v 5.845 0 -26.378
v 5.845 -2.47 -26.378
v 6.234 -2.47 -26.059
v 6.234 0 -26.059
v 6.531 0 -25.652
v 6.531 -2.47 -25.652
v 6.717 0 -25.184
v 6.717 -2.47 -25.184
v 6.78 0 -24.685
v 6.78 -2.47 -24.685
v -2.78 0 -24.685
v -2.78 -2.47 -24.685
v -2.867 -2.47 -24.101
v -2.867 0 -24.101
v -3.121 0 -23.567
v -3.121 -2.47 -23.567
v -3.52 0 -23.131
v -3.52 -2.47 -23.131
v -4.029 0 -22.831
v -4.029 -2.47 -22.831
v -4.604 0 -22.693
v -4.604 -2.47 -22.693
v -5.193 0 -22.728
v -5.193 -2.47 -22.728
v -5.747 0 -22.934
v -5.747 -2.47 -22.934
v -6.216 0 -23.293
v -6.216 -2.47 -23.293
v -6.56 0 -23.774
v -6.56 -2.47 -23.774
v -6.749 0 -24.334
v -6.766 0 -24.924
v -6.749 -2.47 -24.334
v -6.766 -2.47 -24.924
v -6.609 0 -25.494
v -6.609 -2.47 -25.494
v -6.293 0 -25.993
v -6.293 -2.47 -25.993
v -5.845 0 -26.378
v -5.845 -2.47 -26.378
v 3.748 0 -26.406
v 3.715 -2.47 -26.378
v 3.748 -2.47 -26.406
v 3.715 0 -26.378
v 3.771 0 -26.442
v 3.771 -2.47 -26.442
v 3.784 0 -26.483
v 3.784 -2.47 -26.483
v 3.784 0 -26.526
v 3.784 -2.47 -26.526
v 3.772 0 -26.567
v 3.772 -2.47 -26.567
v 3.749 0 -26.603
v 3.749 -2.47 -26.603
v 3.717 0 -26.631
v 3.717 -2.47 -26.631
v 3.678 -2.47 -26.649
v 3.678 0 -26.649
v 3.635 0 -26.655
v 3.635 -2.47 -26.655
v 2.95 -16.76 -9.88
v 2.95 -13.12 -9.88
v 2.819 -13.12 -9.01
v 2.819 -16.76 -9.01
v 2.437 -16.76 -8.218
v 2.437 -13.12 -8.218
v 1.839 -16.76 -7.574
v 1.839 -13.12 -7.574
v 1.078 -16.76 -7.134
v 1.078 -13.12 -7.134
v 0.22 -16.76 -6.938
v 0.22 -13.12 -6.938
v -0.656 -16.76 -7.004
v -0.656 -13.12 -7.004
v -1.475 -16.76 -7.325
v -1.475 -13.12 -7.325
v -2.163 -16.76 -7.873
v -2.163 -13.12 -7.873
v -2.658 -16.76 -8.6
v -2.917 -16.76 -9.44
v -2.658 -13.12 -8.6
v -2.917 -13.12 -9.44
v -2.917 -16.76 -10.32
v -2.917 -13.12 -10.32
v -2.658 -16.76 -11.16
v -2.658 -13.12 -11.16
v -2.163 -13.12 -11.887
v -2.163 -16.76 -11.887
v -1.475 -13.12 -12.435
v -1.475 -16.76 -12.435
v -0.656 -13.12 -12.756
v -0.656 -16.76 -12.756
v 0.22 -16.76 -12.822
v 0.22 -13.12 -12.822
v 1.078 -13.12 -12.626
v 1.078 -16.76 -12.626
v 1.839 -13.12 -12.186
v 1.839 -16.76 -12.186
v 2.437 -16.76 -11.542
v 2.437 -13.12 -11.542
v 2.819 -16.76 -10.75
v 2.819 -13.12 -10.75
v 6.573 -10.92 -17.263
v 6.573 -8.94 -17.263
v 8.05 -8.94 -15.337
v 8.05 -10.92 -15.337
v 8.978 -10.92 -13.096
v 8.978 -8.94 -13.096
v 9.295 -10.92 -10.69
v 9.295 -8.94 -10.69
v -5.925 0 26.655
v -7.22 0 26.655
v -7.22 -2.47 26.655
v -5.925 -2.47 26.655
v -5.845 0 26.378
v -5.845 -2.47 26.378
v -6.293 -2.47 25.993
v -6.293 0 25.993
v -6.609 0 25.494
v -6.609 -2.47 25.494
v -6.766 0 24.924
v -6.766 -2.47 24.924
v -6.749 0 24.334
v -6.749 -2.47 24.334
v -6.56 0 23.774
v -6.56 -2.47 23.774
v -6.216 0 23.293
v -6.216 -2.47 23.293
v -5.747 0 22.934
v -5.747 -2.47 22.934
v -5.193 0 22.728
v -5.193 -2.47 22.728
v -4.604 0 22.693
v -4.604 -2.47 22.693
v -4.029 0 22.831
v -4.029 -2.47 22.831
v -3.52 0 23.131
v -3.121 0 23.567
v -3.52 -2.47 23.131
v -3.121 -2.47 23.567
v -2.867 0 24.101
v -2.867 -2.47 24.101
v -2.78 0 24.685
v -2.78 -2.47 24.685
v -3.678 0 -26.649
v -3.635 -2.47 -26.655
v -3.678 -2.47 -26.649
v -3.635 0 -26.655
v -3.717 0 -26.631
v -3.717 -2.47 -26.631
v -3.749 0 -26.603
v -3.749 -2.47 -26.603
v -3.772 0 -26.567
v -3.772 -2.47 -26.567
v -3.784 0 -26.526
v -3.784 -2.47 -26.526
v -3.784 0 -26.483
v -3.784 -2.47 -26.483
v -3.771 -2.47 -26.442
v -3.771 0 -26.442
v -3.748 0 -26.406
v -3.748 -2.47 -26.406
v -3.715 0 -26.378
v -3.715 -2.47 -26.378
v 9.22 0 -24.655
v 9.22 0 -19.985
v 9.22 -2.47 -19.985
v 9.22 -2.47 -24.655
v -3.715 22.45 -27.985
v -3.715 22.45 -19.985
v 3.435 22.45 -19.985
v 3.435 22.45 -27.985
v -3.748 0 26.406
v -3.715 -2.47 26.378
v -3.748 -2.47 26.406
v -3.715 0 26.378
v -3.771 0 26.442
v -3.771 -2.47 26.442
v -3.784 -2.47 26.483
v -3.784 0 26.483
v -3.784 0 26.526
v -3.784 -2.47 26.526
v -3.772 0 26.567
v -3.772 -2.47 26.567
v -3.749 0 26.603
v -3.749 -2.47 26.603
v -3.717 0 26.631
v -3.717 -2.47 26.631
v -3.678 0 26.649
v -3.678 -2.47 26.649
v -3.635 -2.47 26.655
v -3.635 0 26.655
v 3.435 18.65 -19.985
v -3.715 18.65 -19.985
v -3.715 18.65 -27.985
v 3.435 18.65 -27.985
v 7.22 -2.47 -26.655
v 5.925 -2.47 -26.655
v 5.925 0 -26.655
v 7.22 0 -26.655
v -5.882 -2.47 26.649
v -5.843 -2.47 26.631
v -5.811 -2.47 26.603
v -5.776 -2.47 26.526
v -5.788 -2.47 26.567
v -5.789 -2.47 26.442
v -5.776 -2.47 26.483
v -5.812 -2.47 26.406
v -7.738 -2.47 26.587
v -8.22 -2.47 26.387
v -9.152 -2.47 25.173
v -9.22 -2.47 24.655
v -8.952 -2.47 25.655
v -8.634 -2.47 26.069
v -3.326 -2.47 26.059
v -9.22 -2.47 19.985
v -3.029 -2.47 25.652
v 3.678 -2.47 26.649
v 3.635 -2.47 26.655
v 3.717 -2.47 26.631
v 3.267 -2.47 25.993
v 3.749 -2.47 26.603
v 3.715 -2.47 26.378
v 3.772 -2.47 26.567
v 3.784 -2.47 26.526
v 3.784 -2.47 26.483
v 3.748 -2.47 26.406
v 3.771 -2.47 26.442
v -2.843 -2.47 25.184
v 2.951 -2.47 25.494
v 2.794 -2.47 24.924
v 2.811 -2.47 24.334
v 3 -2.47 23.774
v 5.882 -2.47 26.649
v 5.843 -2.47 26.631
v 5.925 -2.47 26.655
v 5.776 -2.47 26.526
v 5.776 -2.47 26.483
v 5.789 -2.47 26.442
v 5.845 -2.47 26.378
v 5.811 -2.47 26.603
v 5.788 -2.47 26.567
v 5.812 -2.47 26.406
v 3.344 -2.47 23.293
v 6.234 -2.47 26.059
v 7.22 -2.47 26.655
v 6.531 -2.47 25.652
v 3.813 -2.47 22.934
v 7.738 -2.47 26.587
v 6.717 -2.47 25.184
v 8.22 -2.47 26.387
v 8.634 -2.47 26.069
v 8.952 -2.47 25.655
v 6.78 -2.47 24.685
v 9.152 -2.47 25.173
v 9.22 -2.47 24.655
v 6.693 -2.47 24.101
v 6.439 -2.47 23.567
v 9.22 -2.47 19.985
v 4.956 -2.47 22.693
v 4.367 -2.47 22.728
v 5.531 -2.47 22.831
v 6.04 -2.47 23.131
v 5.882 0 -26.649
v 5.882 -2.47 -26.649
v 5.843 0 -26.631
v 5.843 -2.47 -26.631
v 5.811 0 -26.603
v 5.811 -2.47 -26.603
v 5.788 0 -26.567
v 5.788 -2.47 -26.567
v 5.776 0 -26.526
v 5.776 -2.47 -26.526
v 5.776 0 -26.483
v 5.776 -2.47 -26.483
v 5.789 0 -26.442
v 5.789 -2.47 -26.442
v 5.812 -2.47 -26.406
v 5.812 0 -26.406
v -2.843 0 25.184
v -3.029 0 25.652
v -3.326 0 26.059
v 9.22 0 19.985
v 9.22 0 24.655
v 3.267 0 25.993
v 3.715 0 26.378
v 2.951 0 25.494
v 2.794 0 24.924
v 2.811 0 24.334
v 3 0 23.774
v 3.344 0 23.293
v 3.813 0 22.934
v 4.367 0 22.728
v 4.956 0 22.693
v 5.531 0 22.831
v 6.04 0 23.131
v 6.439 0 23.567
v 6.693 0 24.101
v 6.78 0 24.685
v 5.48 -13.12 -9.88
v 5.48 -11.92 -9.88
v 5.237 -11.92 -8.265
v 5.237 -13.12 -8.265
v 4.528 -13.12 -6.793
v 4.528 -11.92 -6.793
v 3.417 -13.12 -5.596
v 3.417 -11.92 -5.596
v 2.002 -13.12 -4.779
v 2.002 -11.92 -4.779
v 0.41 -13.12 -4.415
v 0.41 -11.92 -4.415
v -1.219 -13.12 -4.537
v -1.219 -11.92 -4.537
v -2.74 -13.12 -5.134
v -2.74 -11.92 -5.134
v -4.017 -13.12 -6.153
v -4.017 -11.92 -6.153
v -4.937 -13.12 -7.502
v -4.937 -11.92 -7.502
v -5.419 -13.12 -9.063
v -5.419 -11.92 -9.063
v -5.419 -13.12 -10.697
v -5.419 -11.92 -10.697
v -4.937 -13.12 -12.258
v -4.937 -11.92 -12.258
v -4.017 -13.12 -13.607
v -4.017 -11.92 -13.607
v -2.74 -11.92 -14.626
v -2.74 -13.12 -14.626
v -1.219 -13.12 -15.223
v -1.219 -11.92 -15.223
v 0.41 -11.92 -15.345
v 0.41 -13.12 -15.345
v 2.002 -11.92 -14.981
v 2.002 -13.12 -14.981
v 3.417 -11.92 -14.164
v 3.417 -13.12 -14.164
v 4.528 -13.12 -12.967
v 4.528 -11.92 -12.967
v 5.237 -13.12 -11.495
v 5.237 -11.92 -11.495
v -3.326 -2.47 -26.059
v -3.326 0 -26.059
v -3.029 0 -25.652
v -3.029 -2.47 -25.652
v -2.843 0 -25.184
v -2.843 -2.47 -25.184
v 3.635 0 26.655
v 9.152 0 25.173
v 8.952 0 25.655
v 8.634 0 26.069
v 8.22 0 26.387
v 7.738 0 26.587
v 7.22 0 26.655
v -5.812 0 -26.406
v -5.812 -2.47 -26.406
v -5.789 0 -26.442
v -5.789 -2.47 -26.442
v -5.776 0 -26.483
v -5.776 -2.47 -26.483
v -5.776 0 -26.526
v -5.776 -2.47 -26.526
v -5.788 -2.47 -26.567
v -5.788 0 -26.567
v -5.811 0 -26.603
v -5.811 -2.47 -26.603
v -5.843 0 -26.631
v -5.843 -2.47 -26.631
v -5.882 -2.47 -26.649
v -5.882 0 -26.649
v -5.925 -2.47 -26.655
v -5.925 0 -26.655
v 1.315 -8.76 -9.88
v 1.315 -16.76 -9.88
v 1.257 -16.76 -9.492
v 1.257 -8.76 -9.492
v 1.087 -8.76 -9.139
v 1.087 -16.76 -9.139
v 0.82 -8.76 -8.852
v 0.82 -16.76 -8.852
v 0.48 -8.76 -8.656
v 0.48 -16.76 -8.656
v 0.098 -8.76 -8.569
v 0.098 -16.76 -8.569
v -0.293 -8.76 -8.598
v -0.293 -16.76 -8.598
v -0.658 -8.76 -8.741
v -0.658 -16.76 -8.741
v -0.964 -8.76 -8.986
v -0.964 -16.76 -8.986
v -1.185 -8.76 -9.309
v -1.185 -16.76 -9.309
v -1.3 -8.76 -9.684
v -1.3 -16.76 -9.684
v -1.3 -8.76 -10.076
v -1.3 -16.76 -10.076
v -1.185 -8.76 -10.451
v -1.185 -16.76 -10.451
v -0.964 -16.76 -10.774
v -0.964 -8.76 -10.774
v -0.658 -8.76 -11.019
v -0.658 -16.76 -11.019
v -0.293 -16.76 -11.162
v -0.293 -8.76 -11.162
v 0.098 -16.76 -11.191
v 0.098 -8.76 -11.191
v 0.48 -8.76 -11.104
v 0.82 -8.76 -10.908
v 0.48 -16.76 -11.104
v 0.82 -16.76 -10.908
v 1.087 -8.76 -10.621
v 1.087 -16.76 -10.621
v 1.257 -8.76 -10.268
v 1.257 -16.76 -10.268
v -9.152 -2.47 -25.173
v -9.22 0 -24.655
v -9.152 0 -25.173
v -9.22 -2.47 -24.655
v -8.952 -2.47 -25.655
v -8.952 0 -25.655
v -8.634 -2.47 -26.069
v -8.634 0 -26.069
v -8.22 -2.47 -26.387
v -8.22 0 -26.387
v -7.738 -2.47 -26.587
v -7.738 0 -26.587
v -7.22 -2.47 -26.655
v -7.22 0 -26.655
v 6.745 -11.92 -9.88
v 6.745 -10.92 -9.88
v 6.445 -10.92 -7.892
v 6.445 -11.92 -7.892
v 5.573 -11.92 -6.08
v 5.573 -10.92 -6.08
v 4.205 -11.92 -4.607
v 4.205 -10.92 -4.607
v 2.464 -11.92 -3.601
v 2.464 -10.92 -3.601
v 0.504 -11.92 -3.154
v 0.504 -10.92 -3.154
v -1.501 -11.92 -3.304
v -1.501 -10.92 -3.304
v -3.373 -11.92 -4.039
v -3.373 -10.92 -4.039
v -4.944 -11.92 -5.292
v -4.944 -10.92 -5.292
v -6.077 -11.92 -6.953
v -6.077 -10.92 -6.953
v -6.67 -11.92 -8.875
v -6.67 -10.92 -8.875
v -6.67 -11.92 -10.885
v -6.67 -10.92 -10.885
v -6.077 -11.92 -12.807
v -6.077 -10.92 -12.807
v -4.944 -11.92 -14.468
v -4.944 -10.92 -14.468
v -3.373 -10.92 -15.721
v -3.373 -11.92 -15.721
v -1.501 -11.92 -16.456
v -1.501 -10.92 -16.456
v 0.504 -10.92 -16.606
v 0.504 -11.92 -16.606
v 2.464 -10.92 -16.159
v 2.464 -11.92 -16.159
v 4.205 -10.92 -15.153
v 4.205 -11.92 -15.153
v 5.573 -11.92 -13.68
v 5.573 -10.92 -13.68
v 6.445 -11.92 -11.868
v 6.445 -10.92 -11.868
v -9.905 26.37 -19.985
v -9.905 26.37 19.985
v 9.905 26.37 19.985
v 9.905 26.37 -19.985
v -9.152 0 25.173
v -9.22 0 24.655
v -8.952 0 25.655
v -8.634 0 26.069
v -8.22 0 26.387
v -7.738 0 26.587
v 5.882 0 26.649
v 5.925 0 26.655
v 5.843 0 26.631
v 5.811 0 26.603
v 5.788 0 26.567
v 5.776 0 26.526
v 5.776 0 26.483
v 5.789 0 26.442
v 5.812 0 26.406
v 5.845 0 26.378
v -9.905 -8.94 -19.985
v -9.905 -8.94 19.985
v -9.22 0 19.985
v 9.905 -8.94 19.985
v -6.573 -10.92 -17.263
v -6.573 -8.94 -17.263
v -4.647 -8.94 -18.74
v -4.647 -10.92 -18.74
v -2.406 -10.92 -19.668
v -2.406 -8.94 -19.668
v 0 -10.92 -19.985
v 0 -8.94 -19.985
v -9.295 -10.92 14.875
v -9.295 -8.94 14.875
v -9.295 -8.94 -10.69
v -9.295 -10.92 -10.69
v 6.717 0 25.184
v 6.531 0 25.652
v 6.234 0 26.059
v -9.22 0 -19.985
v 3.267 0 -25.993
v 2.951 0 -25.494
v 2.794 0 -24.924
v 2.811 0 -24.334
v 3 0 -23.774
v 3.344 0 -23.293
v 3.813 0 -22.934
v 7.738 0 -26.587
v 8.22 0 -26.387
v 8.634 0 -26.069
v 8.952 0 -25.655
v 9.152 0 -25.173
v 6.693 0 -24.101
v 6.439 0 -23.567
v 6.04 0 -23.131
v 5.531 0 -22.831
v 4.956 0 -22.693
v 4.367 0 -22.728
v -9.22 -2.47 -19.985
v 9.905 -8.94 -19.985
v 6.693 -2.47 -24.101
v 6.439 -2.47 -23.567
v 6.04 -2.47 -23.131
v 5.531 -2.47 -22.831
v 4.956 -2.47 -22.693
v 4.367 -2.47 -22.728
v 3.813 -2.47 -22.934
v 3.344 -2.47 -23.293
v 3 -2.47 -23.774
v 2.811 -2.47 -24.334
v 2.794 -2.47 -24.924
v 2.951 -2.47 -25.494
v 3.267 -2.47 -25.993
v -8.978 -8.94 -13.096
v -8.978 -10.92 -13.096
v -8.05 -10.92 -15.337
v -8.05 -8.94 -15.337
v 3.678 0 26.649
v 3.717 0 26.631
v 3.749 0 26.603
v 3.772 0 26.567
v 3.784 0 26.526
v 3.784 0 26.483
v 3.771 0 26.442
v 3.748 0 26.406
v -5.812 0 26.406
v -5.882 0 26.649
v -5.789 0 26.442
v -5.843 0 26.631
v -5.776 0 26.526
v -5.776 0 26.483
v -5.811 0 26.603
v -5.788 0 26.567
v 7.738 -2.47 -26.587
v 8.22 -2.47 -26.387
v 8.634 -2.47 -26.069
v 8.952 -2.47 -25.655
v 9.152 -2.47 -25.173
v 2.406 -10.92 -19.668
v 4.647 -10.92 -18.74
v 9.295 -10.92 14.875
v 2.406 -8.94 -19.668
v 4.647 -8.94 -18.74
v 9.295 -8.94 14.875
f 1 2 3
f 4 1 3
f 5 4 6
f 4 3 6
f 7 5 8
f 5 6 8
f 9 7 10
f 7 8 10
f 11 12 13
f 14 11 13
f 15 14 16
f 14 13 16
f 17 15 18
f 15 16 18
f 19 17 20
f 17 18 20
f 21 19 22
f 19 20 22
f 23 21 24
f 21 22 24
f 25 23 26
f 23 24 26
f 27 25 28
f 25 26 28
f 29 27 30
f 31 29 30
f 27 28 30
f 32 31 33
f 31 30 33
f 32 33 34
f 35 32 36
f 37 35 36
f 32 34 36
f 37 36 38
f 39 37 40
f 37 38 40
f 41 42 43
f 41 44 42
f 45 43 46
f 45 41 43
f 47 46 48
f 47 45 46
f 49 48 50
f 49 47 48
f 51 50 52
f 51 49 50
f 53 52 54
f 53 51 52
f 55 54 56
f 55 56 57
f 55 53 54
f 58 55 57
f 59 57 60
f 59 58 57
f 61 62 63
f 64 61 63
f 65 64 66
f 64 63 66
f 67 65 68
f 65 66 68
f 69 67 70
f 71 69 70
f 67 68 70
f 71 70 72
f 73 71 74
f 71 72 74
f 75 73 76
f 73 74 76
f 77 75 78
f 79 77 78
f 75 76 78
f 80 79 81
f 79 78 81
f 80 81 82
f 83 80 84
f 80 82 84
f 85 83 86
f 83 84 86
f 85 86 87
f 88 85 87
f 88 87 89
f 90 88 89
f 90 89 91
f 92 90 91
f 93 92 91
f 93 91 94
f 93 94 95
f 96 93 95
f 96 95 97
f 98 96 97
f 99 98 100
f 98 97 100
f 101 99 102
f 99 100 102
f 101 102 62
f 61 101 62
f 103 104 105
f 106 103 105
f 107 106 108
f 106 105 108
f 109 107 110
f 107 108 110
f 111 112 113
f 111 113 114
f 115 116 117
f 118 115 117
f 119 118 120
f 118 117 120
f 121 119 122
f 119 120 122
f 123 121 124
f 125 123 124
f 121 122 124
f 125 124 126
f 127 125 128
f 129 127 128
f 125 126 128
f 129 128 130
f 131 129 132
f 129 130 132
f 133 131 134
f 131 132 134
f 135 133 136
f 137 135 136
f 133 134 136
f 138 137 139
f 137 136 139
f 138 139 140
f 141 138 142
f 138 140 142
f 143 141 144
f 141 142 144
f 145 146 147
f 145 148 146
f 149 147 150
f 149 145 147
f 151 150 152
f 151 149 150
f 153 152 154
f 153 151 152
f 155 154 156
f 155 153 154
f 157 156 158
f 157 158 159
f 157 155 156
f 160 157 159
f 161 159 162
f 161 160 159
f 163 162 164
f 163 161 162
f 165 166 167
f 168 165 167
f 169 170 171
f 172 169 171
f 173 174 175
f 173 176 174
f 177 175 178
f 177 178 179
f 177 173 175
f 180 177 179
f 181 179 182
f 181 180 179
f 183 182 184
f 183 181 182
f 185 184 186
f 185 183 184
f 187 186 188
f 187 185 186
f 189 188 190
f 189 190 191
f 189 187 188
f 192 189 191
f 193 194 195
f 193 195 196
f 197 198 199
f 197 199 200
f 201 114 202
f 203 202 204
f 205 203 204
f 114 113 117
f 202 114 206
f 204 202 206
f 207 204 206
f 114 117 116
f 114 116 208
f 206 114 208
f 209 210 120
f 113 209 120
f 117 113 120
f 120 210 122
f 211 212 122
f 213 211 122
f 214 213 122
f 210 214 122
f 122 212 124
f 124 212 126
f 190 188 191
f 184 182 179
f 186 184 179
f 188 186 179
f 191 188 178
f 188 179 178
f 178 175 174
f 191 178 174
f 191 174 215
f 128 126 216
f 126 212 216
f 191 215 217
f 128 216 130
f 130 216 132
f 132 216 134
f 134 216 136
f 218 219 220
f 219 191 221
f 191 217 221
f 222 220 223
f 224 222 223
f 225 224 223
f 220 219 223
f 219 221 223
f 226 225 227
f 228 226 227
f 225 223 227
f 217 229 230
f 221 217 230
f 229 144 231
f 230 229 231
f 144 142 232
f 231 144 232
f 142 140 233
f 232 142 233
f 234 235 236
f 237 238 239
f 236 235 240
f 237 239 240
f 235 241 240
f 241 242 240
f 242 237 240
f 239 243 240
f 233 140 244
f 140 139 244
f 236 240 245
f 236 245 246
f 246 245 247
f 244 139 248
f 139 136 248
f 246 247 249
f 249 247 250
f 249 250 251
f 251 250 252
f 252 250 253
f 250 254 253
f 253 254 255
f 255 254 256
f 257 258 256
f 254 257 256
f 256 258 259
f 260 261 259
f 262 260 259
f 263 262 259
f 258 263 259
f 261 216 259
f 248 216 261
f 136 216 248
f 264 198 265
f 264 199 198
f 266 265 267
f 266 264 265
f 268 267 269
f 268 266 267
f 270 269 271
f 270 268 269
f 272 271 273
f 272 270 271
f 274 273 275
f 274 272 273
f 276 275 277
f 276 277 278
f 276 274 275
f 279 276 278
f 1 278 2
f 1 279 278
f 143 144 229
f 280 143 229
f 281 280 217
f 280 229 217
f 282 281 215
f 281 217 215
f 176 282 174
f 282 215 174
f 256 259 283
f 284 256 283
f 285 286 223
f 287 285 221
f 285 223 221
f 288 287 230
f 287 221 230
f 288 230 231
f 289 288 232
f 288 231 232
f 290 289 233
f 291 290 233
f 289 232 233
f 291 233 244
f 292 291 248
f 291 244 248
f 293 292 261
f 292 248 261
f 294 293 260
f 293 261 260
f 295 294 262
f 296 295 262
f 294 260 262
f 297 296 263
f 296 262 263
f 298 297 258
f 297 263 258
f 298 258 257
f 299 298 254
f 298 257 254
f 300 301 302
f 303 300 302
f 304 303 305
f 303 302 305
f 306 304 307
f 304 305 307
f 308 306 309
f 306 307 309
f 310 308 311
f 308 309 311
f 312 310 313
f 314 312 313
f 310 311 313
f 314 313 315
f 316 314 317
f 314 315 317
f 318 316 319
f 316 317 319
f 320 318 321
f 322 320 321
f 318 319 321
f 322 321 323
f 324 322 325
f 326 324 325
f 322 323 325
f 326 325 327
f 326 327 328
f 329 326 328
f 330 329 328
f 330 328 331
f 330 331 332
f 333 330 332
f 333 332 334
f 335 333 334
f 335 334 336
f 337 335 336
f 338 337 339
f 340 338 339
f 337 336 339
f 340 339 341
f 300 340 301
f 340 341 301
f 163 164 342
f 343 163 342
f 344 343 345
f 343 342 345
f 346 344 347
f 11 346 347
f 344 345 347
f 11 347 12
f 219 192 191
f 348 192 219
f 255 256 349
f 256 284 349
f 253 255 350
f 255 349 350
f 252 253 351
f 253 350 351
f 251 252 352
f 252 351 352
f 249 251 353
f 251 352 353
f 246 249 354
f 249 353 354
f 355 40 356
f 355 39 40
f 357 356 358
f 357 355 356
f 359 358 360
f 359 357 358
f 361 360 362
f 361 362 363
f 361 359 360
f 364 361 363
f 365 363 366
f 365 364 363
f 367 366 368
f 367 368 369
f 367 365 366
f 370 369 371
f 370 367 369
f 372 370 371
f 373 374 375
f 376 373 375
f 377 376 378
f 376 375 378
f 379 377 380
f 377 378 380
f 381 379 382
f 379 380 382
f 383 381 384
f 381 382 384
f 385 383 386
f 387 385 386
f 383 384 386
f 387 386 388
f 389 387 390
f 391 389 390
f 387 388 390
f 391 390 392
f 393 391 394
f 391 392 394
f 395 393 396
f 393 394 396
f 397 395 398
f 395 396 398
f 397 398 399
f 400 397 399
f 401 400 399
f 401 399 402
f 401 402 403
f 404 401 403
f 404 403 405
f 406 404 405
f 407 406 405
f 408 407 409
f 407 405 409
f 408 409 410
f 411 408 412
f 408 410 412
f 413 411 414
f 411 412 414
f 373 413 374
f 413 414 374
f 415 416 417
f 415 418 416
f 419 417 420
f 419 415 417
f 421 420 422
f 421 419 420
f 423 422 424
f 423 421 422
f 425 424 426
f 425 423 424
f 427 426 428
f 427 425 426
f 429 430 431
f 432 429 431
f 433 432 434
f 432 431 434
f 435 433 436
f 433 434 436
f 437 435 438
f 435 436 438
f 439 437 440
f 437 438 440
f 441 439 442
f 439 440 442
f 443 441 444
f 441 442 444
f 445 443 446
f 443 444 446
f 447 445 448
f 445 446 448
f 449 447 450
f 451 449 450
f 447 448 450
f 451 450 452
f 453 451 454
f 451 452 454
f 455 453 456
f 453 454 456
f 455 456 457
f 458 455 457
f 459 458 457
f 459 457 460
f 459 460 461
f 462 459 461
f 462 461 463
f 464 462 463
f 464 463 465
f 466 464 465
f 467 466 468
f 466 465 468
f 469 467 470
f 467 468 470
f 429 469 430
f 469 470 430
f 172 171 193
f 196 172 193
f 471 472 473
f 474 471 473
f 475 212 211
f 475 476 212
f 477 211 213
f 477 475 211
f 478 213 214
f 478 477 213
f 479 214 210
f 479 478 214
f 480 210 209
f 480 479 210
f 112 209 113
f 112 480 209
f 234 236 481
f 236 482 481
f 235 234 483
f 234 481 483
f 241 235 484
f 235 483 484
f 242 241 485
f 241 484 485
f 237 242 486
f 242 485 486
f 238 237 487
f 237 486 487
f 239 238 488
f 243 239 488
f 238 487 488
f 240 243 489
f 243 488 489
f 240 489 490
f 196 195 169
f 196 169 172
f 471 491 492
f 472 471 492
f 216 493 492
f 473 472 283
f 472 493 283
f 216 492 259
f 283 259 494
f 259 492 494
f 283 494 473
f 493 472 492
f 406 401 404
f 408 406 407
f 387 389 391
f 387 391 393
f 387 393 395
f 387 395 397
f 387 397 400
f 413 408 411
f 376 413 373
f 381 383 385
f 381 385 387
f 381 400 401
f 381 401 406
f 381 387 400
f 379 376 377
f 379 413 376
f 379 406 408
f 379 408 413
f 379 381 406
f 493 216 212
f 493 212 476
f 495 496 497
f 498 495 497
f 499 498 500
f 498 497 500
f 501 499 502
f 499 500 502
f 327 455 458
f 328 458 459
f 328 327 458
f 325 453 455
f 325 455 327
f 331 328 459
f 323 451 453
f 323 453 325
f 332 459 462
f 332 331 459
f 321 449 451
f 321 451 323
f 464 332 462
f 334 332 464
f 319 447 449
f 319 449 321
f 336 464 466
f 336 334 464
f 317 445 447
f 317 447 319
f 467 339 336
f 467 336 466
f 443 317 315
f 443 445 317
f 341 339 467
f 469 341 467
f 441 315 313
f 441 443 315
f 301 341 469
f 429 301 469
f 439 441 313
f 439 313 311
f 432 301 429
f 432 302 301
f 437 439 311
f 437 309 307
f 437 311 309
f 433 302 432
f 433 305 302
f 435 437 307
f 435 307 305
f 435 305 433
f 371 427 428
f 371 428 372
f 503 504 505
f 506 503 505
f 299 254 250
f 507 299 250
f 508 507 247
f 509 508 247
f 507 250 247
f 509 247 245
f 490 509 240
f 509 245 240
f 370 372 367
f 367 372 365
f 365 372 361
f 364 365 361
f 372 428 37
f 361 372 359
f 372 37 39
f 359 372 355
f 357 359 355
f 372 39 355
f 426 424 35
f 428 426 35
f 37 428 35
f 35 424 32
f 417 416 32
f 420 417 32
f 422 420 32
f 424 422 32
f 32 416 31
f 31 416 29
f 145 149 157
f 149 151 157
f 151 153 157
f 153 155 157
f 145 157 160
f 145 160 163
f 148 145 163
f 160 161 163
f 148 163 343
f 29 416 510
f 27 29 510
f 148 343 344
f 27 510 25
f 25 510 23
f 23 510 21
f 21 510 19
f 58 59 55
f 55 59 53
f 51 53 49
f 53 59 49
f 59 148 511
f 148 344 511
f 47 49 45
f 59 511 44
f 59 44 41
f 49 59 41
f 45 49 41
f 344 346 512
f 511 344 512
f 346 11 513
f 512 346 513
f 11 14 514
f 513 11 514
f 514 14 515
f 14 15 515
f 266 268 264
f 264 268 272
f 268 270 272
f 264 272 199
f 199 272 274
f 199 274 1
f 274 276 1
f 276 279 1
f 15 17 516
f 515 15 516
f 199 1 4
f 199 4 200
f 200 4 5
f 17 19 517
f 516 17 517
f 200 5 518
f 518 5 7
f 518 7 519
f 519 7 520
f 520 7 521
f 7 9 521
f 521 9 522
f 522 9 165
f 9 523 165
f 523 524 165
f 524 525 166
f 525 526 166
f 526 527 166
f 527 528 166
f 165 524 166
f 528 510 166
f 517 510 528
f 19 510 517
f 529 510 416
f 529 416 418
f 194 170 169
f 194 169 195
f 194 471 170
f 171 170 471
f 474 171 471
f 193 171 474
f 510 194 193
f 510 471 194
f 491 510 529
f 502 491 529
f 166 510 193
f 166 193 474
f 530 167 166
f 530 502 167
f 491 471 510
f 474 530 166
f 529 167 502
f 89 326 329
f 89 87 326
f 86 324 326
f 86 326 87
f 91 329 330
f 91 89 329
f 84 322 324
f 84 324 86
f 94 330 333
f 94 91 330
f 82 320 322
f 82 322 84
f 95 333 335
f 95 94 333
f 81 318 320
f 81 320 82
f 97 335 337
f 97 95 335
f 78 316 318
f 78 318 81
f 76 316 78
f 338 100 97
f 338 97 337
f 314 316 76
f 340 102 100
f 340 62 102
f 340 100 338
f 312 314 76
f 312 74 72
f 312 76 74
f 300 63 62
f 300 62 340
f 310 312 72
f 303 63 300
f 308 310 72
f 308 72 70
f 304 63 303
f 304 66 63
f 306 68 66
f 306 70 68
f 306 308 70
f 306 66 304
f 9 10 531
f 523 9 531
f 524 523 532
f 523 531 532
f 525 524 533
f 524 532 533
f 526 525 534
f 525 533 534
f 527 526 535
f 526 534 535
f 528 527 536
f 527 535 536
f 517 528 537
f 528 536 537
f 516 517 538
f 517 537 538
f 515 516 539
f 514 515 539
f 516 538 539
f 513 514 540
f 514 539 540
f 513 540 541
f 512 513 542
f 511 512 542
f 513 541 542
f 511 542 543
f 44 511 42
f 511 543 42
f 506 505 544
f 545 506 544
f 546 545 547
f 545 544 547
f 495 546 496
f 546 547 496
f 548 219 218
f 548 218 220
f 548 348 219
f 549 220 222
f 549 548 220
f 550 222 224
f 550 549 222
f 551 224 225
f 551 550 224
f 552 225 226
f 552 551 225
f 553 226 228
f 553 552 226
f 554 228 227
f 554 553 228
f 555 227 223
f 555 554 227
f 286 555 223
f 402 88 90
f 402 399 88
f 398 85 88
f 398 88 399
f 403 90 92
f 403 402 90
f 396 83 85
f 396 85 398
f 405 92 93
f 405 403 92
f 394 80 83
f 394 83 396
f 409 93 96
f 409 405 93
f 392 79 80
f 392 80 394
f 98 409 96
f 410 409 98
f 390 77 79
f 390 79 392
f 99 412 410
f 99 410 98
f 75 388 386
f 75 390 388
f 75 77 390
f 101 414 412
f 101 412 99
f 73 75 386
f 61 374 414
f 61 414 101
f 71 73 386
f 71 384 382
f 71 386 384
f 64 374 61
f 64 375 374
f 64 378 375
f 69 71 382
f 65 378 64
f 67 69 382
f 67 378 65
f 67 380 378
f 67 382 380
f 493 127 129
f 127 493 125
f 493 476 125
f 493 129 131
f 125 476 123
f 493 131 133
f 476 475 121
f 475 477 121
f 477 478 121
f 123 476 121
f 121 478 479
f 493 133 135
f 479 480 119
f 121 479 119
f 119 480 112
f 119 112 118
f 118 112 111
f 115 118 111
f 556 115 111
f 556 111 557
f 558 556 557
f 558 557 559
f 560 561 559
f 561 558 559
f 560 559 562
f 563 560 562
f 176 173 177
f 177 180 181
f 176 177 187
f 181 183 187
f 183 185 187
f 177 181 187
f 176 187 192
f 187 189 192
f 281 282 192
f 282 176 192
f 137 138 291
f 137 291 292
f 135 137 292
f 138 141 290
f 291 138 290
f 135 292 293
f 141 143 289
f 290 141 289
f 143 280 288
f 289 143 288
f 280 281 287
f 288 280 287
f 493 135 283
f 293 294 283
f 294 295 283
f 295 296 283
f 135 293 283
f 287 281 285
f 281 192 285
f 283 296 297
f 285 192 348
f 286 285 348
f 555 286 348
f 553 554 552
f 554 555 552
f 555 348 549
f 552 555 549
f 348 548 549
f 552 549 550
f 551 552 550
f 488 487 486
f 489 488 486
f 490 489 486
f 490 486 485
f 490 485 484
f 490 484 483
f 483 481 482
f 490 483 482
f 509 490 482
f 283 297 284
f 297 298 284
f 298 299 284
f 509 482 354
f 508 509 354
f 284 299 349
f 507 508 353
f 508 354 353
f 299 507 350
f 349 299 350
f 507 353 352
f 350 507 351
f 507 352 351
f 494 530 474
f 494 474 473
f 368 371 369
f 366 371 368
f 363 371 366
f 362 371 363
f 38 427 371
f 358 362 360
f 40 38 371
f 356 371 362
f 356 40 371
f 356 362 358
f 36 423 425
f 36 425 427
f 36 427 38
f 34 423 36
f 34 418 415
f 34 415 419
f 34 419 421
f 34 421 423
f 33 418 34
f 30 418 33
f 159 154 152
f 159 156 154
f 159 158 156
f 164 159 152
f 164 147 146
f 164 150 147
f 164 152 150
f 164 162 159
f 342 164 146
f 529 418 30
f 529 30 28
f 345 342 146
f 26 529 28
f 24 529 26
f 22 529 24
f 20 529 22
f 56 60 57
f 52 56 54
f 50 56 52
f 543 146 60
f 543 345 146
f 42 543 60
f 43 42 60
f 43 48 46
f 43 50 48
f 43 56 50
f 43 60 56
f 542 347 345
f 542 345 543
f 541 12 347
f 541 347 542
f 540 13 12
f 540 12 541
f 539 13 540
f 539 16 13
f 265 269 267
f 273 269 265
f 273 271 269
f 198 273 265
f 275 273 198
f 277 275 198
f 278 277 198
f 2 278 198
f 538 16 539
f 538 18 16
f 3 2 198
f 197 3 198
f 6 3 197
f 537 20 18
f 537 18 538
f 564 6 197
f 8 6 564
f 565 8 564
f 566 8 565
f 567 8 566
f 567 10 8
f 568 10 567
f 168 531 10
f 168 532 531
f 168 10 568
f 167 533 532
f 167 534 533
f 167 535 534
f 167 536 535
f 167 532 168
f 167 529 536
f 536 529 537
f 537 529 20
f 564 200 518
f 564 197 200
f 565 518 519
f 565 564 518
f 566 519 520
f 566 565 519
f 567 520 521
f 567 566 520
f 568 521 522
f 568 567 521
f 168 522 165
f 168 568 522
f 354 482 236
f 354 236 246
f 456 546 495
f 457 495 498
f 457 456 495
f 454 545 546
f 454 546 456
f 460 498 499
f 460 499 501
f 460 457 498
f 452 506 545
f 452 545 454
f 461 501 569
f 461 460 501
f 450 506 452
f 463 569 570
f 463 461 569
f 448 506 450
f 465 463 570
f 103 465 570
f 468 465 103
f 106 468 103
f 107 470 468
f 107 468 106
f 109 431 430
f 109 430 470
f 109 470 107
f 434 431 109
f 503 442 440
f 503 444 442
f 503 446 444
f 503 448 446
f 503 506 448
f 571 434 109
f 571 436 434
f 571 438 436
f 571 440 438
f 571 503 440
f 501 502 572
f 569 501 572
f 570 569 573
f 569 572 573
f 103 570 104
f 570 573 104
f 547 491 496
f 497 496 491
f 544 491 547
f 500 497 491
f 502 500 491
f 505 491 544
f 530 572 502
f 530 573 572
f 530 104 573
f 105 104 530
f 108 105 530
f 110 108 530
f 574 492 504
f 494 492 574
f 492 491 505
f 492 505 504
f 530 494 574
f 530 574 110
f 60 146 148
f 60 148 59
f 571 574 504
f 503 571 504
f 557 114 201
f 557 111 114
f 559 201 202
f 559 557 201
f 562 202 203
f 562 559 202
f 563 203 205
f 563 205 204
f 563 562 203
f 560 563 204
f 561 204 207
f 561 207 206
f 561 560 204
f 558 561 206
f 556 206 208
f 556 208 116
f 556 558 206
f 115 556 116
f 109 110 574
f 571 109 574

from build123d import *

# Parameters (mm, degrees)
F0_W      = 19.81
F0_H      = 39.97
F1_DEPTH  = 8.94
F3_W      = 18.44
F3_H      = 2.47
F4_DEPTH  = 6.67
F2_W      = 18.44
F2_H      = 2.47
F5_DEPTH  = 6.67
F6_DEPTH  = 20.14
F8_DEPTH  = 1.98
F9_R      = 6.745
F10_DEPTH = 1
F11_R     = 5.48
F12_DEPTH = 1.2
F13_R     = 2.95
F14_DEPTH = 3.64
F15_R     = 1.315
F16_DEPTH = 8
F17_DEPTH = 6.23
F18_W     = 7.15
F18_H     = 3.8
F19_DEPTH = 8
F22_DEPTH = 5
F23_R     = 0.15
F24_R     = 2


with BuildPart() as f1:
    # F0 (on Front) → F1 (new body)
    with BuildSketch(Plane.XZ):
        Rectangle(F0_W, F0_H)
    extrude(amount=F1_DEPTH)

    # F3 (on face) → F4 (join)
    with BuildSketch(Plane(origin=(0, 0, -19.985), x_dir=(1, 0, 0), z_dir=(0, 0, -1))):
        with Locations((0, 1.235)):
            Rectangle(F3_W, F3_H)
    extrude(amount=F4_DEPTH)

    # F2 (on face) → F5 (join)
    with BuildSketch(Plane.XY.offset(19.985)):
        with Locations((0, -1.235)):
            Rectangle(F2_W, F2_H)
    extrude(amount=F5_DEPTH)

    # F0 (on Front) → F6 (join)
    with BuildSketch(Plane.XZ):
        Rectangle(F0_W, F0_H)
    extrude(amount=-F6_DEPTH)

    # F7 (on face) → F8 (join)
    with BuildSketch(Plane.XZ.offset(8.94)):
        with BuildLine():
            Line((0, -1.395), (-9.295, -1.395))
            Line((-9.295, -1.395), (-6.5725575311, -4.1174424689))
            ThreePointArc((-6.5725575311, -4.1174424689), (-3.5570425038, -2.1025397453), (0, -1.395))
        make_face()
        with BuildLine():
            Line((6.5725575311, -4.1174424689), (9.295, -1.395))
            Line((9.295, -1.395), (0, -1.395))
            ThreePointArc((0, -1.395), (3.5570425038, -2.1025397453), (6.5725575311, -4.1174424689))
        make_face()
        with BuildLine():
            Line((9.295, -10.69), (9.295, -1.395))
            Line((9.295, -1.395), (6.5725575311, -4.1174424689))
            ThreePointArc((6.5725575311, -4.1174424689), (8.5874602547, -7.1329574962), (9.295, -10.69))
        make_face()
        with BuildLine():
            ThreePointArc((-6.5725575311, -4.1174424689), (-8.5874602547, -7.1329574962), (-9.295, -10.69))
            Line((-9.295, -10.69), (0, -10.69))
            Line((0, -10.69), (-6.5725575311, -4.1174424689))
        make_face()
        with BuildLine():
            Line((0, -10.69), (-9.295, -10.69))
            ThreePointArc((-9.295, -10.69), (-8.5874602547, -14.2470425038), (-6.5725575311, -17.2625575311))
            Line((-6.5725575311, -17.2625575311), (0, -10.69))
        make_face()
        with BuildLine():
            Line((0, -19.985), (0, -10.69))
            Line((0, -10.69), (-6.5725575311, -17.2625575311))
            ThreePointArc((-6.5725575311, -17.2625575311), (-3.5570425038, -19.2774602547), (0, -19.985))
        make_face()
        with BuildLine():
            Line((6.5725575311, -17.2625575311), (0, -10.69))
            Line((0, -10.69), (0, -19.985))
            ThreePointArc((0, -19.985), (3.5570425038, -19.2774602547), (6.5725575311, -17.2625575311))
        make_face()
        with BuildLine():
            ThreePointArc((6.5725575311, -17.2625575311), (8.5874602547, -14.2470425038), (9.295, -10.69))
            Line((9.295, -10.69), (0, -10.69))
            Line((0, -10.69), (6.5725575311, -17.2625575311))
        make_face()
        with BuildLine():
            Line((0, -10.69), (9.295, -10.69))
            ThreePointArc((9.295, -10.69), (8.5874602547, -7.1329574962), (6.5725575311, -4.1174424689))
            Line((6.5725575311, -4.1174424689), (0, -10.69))
        make_face()
        with BuildLine():
            ThreePointArc((6.5725575311, -4.1174424689), (3.5570425038, -2.1025397453), (0, -1.395))
            ThreePointArc((0, -1.395), (-3.5570425038, -2.1025397453), (-6.5725575311, -4.1174424689))
            Line((-6.5725575311, -4.1174424689), (0, -10.69))
            Line((0, -10.69), (6.5725575311, -4.1174424689))
        make_face()
        Polygon((9.295, 14.875), (-9.295, 14.875), (-9.295, -1.395), (0, -1.395), (9.295, -1.395), align=None)
        with BuildLine():
            Line((-6.5725575311, -4.1174424689), (-9.295, -1.395))
            Line((-9.295, -1.395), (-9.295, -10.69))
            ThreePointArc((-9.295, -10.69), (-8.5874602547, -7.1329574962), (-6.5725575311, -4.1174424689))
        make_face()
    extrude(amount=F8_DEPTH)

    # F9 (on face) → F10 (join)
    with BuildSketch(Plane.XZ.offset(10.92)):
        with Locations((0, -9.88)):
            Circle(F9_R)
    extrude(amount=F10_DEPTH)

    # F11 (on face) → F12 (join)
    with BuildSketch(Plane.XZ.offset(11.92)):
        with Locations((0, -9.88)):
            Circle(F11_R)
    extrude(amount=F12_DEPTH)

    # F13 (on face) → F14 (join)
    with BuildSketch(Plane.XZ.offset(13.12)):
        with Locations((0, -9.88)):
            Circle(F13_R)
    extrude(amount=F14_DEPTH)

    # F15 (on face) → F16 (cut)
    with BuildSketch(Plane.XZ.offset(16.76)):
        with Locations((0, -9.88)):
            Circle(F15_R)
    extrude(amount=-F16_DEPTH, mode=Mode.SUBTRACT)

    # F17 (add): a face of the model
    f17_faces = [f1.faces().sort_by_distance(p)[0] for p in [
        (0, 20.14, 0),
    ]]
    extrude(f17_faces, amount=F17_DEPTH)

    # F18 (on face) → F19 (join)
    with BuildSketch(Plane(origin=(0, 0, -19.985), x_dir=(1, 0, 0), z_dir=(0, 0, -1))):
        with Locations((-0.14, -20.55)):
            Rectangle(F18_W, F18_H)
    extrude(amount=F19_DEPTH)

    # F20 (on face) + F21 (on face) → F22 (cut)
    with BuildSketch(Plane.XZ.offset(2.47)):
        with BuildLine():
            Line((5.1251086785, 26.655), (4.4348913215, 26.655))
            ThreePointArc((4.4348913215, 26.655), (3.4935742068, 23.1536252325), (6.78, 24.685))
            ThreePointArc((6.78, 24.685), (6.3113747675, 25.9714257932), (5.1251086785, 26.655))
        make_face()
        with BuildLine():
            ThreePointArc((-5.1251086785, 26.655), (-6.0664257932, 23.1536252325), (-2.78, 24.685))
            ThreePointArc((-2.78, 24.685), (-3.2486252325, 25.9714257932), (-4.4348913215, 26.655))
            Line((-4.4348913215, 26.655), (-5.1251086785, 26.655))
        make_face()
    with BuildSketch(Plane.XZ.offset(2.47)):
        with BuildLine():
            ThreePointArc((6.78, -24.685), (3.4935742068, -23.1536252325), (4.4348913215, -26.655))
            Line((4.4348913215, -26.655), (5.1251086785, -26.655))
            ThreePointArc((5.1251086785, -26.655), (6.3113747675, -25.9714257932), (6.78, -24.685))
        make_face()
        with BuildLine():
            ThreePointArc((-4.4348913215, -26.655), (-3.2486252325, -25.9714257932), (-2.78, -24.685))
            ThreePointArc((-2.78, -24.685), (-6.0664257932, -23.1536252325), (-5.1251086785, -26.655))
            Line((-5.1251086785, -26.655), (-4.4348913215, -26.655))
        make_face()
    extrude(amount=-F22_DEPTH, mode=Mode.SUBTRACT)

    # F23
    f23_edges = [f1.edges().sort_by_distance(p)[0] for p in [
        (-5.125109, -1.235, -26.655),
        (-4.434891, -1.235, -26.655),
        (4.434891, -1.235, -26.655),
        (5.125109, -1.235, -26.655),
        (5.125109, -1.235, 26.655),
        (-4.434891, -1.235, 26.655),
        (-5.125109, -1.235, 26.655),
        (4.434891, -1.235, 26.655),
    ]]
    fillet(f23_edges, radius=F23_R)

    # F24
    f24_edges = [f1.edges().sort_by_distance(p)[0] for p in [
        (9.22, -1.235, 26.655),
        (-9.22, -1.235, 26.655),
        (-9.22, -1.235, -26.655),
        (9.22, -1.235, -26.655),
    ]]
    fillet(f24_edges, radius=F24_R)


solid = f1.part
